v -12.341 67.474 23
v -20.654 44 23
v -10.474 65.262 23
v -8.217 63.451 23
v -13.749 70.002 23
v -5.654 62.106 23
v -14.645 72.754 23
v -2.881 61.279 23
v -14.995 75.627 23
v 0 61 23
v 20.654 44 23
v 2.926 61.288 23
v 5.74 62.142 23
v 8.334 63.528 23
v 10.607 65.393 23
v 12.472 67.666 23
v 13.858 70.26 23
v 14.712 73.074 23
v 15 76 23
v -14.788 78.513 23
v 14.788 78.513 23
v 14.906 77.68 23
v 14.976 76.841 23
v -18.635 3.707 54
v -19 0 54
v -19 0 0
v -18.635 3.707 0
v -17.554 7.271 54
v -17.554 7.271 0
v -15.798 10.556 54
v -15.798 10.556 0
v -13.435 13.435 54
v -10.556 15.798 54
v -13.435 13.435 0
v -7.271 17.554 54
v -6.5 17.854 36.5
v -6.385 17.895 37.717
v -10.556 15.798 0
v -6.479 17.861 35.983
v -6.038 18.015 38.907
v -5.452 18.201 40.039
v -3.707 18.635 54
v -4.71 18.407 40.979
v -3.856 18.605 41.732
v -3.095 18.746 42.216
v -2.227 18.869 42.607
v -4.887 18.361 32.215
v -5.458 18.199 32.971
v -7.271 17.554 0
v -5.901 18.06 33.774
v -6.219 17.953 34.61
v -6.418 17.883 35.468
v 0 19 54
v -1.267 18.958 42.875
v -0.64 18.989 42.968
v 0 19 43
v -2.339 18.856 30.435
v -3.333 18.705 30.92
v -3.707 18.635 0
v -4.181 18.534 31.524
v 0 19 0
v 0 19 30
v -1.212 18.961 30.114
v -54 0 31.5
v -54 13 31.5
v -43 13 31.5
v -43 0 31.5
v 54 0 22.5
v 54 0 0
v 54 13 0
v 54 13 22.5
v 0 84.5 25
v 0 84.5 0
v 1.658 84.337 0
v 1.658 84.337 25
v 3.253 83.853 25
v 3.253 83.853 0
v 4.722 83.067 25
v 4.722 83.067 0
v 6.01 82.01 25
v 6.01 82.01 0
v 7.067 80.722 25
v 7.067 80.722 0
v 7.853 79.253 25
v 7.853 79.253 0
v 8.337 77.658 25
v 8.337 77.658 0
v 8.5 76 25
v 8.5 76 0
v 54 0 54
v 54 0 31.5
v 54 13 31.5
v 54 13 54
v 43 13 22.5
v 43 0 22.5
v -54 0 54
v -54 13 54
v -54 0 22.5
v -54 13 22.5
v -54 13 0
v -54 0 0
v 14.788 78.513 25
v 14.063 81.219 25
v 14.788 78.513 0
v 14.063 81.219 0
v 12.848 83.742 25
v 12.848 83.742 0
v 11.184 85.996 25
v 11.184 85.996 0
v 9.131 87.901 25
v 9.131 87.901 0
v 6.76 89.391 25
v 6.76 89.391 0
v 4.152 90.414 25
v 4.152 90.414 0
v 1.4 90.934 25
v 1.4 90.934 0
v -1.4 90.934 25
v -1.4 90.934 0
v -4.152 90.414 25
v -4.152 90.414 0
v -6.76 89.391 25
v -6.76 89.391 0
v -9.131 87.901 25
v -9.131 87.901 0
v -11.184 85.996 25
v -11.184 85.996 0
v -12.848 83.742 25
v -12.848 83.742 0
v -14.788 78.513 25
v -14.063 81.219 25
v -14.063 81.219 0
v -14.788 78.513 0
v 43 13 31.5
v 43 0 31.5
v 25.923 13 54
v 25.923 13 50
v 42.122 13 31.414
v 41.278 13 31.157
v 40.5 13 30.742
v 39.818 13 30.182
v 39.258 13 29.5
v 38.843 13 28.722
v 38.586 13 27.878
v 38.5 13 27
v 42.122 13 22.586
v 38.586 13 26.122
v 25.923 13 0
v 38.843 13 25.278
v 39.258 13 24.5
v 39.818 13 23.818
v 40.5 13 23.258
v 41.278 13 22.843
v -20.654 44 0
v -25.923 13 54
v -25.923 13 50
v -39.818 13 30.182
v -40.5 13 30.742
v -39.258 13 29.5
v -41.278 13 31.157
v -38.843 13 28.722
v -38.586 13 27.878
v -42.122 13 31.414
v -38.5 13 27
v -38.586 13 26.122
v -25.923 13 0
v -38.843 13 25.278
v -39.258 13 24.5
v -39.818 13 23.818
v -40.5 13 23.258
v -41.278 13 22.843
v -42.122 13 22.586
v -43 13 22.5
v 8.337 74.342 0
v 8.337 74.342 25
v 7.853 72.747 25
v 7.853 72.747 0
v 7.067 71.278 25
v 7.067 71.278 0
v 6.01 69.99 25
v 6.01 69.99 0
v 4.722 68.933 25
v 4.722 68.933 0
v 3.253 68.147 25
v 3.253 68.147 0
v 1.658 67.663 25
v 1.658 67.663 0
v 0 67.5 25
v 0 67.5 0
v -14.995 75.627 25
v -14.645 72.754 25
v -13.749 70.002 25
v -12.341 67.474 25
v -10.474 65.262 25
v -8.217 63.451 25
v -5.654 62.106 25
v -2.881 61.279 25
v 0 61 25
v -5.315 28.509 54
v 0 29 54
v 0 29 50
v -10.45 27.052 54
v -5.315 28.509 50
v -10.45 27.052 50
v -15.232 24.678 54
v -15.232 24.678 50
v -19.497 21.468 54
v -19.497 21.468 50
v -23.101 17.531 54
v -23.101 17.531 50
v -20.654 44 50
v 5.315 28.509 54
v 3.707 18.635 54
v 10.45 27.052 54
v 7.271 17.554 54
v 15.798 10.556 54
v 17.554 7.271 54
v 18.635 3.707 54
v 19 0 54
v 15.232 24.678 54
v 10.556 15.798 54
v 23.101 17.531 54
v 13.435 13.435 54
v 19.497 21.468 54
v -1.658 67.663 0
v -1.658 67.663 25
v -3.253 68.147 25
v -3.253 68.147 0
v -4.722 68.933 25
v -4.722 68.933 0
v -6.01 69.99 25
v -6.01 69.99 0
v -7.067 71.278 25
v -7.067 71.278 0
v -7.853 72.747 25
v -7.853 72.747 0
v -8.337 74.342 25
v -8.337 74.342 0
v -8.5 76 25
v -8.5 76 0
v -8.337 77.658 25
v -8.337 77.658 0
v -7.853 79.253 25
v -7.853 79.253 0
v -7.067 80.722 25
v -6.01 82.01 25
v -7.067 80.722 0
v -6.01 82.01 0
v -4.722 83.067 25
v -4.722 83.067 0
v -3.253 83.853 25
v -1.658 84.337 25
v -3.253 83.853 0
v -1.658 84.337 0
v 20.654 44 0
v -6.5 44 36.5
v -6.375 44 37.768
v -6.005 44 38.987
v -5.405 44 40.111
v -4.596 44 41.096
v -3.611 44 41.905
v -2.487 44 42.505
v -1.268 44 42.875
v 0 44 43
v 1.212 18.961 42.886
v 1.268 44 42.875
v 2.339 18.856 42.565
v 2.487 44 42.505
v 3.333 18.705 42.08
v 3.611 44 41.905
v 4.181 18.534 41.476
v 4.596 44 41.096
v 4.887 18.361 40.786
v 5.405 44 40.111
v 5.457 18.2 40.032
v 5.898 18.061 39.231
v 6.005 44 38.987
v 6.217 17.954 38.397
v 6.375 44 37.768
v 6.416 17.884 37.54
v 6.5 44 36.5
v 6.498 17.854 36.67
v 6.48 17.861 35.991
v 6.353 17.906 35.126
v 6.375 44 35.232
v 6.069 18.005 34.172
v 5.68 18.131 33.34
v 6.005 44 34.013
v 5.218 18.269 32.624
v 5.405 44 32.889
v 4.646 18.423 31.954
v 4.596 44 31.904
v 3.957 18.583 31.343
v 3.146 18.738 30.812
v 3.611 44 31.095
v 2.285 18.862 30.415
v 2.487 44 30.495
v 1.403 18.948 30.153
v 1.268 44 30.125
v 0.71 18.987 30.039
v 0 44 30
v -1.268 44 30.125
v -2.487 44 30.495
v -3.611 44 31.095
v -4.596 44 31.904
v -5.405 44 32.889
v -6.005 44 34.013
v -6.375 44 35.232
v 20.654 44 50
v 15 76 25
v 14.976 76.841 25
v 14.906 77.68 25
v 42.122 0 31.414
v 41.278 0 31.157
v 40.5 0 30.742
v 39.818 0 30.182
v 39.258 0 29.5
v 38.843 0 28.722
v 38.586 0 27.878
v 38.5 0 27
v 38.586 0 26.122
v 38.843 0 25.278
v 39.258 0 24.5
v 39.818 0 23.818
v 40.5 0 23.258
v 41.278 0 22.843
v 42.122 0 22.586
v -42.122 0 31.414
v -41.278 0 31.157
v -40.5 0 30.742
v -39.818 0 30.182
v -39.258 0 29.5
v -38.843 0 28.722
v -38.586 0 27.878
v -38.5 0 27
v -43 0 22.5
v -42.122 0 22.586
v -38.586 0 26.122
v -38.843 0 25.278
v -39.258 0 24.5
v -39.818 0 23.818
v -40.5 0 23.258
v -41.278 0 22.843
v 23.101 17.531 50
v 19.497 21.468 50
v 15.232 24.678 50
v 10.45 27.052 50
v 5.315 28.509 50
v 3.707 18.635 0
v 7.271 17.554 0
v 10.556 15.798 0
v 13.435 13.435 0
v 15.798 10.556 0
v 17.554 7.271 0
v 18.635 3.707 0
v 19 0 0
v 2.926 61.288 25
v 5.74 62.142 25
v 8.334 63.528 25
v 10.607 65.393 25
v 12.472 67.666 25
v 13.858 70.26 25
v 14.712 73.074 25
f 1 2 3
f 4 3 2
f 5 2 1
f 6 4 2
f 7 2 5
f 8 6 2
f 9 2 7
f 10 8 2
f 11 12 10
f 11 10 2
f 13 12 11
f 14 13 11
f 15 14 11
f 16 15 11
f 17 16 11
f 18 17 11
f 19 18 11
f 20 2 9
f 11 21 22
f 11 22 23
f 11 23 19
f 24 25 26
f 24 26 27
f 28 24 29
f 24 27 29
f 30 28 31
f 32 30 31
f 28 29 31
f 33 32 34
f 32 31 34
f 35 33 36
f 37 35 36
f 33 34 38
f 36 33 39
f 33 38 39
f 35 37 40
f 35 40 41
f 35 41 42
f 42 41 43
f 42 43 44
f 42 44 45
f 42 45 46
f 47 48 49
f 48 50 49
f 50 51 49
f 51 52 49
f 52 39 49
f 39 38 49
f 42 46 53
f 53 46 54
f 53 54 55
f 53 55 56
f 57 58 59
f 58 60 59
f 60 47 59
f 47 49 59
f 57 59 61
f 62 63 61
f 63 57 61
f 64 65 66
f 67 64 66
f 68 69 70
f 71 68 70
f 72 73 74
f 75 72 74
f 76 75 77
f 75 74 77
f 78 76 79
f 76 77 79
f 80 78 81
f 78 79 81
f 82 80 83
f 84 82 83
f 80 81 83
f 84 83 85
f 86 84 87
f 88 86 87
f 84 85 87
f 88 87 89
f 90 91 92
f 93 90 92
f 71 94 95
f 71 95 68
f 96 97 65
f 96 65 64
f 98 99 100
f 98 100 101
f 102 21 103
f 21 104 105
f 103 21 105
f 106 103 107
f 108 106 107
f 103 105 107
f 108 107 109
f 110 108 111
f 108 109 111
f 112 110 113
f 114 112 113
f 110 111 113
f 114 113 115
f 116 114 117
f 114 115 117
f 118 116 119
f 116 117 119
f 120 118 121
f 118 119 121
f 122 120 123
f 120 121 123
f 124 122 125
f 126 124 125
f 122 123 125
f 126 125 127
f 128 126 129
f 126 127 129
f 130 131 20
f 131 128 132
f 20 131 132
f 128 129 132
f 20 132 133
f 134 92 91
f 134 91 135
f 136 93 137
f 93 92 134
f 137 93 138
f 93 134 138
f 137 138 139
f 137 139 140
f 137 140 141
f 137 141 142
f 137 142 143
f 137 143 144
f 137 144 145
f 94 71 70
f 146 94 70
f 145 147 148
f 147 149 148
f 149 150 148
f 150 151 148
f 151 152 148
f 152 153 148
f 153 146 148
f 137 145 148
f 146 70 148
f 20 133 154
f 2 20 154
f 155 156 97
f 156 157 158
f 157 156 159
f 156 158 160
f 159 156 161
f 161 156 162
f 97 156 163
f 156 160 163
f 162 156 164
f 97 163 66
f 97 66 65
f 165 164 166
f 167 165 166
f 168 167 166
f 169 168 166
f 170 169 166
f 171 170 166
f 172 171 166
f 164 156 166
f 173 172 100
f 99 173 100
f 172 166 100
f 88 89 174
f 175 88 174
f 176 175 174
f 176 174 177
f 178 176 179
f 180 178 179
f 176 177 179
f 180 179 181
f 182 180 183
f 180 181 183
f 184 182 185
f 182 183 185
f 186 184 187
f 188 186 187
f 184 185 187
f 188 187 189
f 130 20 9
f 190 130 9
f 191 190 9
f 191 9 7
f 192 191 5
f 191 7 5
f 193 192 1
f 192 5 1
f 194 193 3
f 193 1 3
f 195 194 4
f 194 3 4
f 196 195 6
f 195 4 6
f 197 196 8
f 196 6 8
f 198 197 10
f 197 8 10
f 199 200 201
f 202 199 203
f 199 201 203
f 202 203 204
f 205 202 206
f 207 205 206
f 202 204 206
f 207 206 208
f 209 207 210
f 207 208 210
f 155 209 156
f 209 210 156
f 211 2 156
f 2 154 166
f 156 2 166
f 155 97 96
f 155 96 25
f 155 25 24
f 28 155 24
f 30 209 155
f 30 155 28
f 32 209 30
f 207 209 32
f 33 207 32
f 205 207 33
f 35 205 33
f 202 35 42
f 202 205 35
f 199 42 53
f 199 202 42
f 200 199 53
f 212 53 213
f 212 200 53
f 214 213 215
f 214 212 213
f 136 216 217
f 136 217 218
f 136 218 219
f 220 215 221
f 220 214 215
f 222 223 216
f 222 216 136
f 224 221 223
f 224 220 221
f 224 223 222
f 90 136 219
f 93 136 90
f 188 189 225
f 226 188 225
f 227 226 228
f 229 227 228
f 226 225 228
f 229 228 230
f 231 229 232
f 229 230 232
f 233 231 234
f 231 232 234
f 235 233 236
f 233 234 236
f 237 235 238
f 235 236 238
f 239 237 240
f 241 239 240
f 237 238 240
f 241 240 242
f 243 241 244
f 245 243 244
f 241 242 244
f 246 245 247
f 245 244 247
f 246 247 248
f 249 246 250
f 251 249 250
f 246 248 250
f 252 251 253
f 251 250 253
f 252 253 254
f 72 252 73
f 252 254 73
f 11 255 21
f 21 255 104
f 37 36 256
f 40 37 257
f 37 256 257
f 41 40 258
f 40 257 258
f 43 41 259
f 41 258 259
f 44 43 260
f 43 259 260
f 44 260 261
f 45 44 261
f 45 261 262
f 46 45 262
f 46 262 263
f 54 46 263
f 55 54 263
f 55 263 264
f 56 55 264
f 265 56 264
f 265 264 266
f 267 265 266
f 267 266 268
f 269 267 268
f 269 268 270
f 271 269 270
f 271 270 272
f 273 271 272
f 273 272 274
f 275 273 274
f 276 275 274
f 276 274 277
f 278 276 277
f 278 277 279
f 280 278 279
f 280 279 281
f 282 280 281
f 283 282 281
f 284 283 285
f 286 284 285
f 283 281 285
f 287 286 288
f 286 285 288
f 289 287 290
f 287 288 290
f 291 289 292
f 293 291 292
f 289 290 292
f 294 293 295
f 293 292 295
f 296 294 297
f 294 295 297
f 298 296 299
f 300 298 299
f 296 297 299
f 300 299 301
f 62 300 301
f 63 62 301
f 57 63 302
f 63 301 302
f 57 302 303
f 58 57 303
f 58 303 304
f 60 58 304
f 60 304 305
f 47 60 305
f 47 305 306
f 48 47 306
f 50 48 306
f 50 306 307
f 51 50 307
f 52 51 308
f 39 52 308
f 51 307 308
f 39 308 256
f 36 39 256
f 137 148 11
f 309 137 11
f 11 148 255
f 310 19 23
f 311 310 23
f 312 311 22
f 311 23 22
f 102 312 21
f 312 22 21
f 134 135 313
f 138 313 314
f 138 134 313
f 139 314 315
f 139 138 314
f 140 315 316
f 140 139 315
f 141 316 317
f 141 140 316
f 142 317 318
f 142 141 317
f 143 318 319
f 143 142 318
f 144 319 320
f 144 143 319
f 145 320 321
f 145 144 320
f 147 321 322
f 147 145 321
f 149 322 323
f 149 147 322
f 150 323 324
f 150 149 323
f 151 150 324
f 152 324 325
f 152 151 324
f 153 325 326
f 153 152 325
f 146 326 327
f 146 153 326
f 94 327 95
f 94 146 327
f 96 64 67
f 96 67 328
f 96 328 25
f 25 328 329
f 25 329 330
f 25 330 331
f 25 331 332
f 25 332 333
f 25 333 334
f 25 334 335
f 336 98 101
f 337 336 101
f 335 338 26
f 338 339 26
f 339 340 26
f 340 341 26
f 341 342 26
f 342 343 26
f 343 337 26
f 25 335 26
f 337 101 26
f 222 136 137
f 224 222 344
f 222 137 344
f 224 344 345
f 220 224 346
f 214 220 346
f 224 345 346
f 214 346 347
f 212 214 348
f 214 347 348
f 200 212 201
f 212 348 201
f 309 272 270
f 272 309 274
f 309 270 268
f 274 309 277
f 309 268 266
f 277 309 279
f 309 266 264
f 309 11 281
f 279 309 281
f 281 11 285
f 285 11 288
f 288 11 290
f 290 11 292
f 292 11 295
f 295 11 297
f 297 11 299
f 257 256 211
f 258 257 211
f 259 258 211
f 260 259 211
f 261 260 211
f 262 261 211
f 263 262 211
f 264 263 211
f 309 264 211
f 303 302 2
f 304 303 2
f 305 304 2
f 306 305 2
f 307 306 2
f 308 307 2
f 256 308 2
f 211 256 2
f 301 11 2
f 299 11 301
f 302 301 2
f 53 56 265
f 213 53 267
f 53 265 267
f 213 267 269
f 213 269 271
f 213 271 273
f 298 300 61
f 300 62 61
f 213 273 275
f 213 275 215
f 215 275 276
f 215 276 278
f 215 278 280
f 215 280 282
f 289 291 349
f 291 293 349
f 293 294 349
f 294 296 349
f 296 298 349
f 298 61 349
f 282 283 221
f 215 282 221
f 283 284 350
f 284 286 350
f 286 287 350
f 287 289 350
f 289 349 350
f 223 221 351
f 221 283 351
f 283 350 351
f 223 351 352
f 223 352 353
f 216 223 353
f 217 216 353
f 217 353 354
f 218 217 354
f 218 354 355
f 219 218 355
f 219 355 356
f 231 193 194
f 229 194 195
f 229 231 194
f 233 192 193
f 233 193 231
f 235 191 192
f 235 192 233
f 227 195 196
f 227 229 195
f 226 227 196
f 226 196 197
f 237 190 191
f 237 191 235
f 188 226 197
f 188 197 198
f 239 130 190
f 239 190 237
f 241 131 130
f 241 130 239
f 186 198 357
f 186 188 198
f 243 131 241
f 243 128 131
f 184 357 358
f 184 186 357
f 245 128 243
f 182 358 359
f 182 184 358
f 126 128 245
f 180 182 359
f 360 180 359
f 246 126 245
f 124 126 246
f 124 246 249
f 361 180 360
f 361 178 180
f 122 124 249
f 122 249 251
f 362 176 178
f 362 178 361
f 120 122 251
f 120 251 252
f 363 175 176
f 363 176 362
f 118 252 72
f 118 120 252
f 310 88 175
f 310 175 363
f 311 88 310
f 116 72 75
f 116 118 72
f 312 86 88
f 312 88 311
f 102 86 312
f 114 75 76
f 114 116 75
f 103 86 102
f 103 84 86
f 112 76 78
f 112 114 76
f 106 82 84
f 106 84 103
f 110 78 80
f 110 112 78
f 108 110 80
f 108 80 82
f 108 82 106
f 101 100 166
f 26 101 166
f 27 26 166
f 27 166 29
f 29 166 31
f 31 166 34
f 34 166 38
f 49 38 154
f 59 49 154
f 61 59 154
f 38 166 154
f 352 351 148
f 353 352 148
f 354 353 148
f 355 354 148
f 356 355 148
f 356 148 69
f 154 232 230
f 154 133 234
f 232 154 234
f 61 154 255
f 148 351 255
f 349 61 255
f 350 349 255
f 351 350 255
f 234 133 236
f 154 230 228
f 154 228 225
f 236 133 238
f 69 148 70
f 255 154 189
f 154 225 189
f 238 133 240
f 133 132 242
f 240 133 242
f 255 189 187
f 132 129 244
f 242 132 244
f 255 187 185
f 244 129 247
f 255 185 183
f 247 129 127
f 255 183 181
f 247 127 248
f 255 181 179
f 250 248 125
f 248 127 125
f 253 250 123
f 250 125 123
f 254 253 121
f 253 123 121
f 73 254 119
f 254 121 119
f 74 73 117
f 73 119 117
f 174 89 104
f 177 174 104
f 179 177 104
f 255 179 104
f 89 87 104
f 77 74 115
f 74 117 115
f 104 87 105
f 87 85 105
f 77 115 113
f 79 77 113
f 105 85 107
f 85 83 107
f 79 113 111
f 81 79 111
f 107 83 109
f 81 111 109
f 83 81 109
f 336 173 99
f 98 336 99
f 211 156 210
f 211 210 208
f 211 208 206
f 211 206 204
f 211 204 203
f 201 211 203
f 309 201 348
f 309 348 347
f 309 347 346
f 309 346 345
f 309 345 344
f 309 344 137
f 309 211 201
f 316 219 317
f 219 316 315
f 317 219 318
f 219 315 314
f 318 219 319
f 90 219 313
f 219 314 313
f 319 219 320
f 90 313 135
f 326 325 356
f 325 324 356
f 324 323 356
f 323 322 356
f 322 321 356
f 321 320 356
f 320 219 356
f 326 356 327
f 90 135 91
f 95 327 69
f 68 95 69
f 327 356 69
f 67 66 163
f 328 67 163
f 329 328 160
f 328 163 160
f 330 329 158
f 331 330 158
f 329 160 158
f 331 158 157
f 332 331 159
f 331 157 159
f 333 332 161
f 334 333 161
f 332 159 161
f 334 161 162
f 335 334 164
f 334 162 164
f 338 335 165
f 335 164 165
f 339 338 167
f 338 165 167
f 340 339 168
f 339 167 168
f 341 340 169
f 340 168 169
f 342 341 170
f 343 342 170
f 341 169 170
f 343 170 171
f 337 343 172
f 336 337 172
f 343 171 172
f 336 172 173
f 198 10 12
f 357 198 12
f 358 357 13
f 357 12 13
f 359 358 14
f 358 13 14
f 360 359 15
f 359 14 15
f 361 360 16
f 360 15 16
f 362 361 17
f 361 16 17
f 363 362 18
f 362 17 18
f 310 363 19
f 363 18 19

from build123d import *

# Parameters (mm, degrees)
EXTRUDE_1_DEPTH          = 54
EXTRUDE_2_DEPTH          = 50
EXTRUDE_3_DEPTH          = 23
EXTRUDE_4_DEPTH          = 25
CUT_EXTRUDE_1_REACH      = 91.672
CUT_EXTRUDE_1_END_RADIUS = 19
SKETCH_2_R               = 6.5
CUT_EXTRUDE_2_REACH      = 111.16


with BuildPart() as part:
    # 草图1 → 凸台-拉伸1 (new body)
    with BuildSketch(Plane.XY):
        with BuildLine():
            Line((54, 13), (25.922962794, 13))
            ThreePointArc((25.922962794, 13), (15.231546212, 24.677925359), (0, 29))
            Line((0, 29), (0, 19))
            ThreePointArc((0, 19), (13.435028843, 13.435028843), (19, 0))
            Line((19, 0), (54, 0))
            Line((54, 0), (54, 13))
        make_face()
        with BuildLine():
            ThreePointArc((0, 29), (-15.231546212, 24.677925359), (-25.922962794, 13))
            Line((-25.922962794, 13), (-54, 13))
            Line((-54, 13), (-54, 0))
            Line((-54, 0), (-19, 0))
            ThreePointArc((-19, 0), (-13.435028843, 13.435028843), (0, 19))
            Line((0, 19), (0, 29))
        make_face()
    extrude(amount=EXTRUDE_1_DEPTH)

    # 草图1<3> → 凸台-拉伸2 (add)
    with BuildSketch(Plane.XY):
        with BuildLine():
            Line((25.922962794, 13), (20.654024341, 44))
            Line((20.654024341, 44), (0, 44))
            Line((0, 44), (0, 29))
            ThreePointArc((0, 29), (15.231546212, 24.677925359), (25.922962794, 13))
        make_face()
        with BuildLine():
            Line((0, 44), (-20.654024341, 44))
            Line((-20.654024341, 44), (-25.922962794, 13))
            ThreePointArc((-25.922962794, 13), (-15.231546212, 24.677925359), (0, 29))
            Line((0, 29), (0, 44))
        make_face()
    extrude(amount=EXTRUDE_2_DEPTH)

    # 草图1<5> → 凸台-拉伸3 (add)
    with BuildSketch(Plane.XY):
        with BuildLine():
            ThreePointArc((0, 61), (-11.460837745, 66.322748418), (-14.78792136, 78.513440241))
            Line((-14.78792136, 78.513440241), (-20.654024341, 44))
            Line((-20.654024341, 44), (0, 44))
            Line((0, 44), (0, 61))
        make_face()
        with BuildLine():
            Line((20.654024341, 44), (14.78792136, 78.513440241))
            ThreePointArc((14.78792136, 78.513440241), (14.946886305, 77.26118587), (15, 76))
            ThreePointArc((15, 76), (10.606601718, 65.393398282), (0, 61))
            Line((0, 61), (0, 44))
            Line((0, 44), (20.654024341, 44))
        make_face()
    extrude(amount=EXTRUDE_3_DEPTH)

    # 草图1<6> → 凸台-拉伸4 (add)
    with BuildSketch(Plane.XY):
        with BuildLine():
            ThreePointArc((14.78792136, 78.513440241), (9.677251582, 87.460837745), (0, 91))
            Line((0, 91), (0, 84.5))
            ThreePointArc((0, 84.5), (6.01040764, 82.01040764), (8.5, 76))
            ThreePointArc((8.5, 76), (6.01040764, 69.98959236), (0, 67.5))
            Line((0, 67.5), (0, 61))
            ThreePointArc((0, 61), (10.606601718, 65.393398282), (15, 76))
            ThreePointArc((15, 76), (14.946886305, 77.26118587), (14.78792136, 78.513440241))
        make_face()
        with BuildLine():
            Line((0, 84.5), (0, 91))
            ThreePointArc((0, 91), (-9.677251582, 87.460837745), (-14.78792136, 78.513440241))
            ThreePointArc((-14.78792136, 78.513440241), (-11.460837745, 66.322748418), (0, 61))
            Line((0, 61), (0, 67.5))
            ThreePointArc((0, 67.5), (-8.5, 76), (0, 84.5))
        make_face()
    extrude(amount=EXTRUDE_4_DEPTH)

    # 切除-拉伸1: up to this cylinder (the profile starts outside it)
    cut_extrude_1_end = Plane(origin=(0, 0, 36.5), z_dir=(0, 0, -1)) * Cylinder(CUT_EXTRUDE_1_END_RADIUS, 222.344, mode=Mode.PRIVATE)
    # 草图2 → 切除-拉伸1 (cut, up to the surface)
    with BuildSketch(Plane(origin=(0, 44, 0), x_dir=(1, 0, 0), z_dir=(0, 1, 0)), mode=Mode.PRIVATE) as cut_extrude_1_sk1:
        with Locations(Location((0, -36.5, 0), (0, 0, 180))):
            Circle(SKETCH_2_R)
    cut_extrude_1_tool1 = extrude(cut_extrude_1_sk1.sketch, amount=-CUT_EXTRUDE_1_REACH, mode=Mode.PRIVATE) - cut_extrude_1_end
    add(cut_extrude_1_tool1.solids().sort_by_distance((0, 44, 36.5))[0], mode=Mode.SUBTRACT)

    # 草图3 → 切除-拉伸2 (cut, up to next)
    with BuildSketch(Plane(origin=(0, 13, 0), x_dir=(1, 0, 0), z_dir=(0, 1, 0)), mode=Mode.PRIVATE) as cut_extrude_2_sk1:
        with BuildLine():
            Line((-43, -22.5), (-54, -22.5))
            Line((-54, -22.5), (-54, -31.5))
            Line((-54, -31.5), (-43, -31.5))
            ThreePointArc((-43, -31.5), (-38.5, -27), (-43, -22.5))
        make_face()
    cut_extrude_2_tool1 = extrude(cut_extrude_2_sk1.sketch, amount=-CUT_EXTRUDE_2_REACH, mode=Mode.PRIVATE) & part.part
    # 草图3 → 切除-拉伸2 (cut, up to next)
    with BuildSketch(Plane(origin=(0, 13, 0), x_dir=(1, 0, 0), z_dir=(0, 1, 0)), mode=Mode.PRIVATE) as cut_extrude_2_sk2:
        with BuildLine():
            Line((54, -22.5), (54, -31.5))
            Line((54, -31.5), (43, -31.5))
            ThreePointArc((43, -31.5), (38.5, -27), (43, -22.5))
            Line((43, -22.5), (54, -22.5))
        make_face()
    cut_extrude_2_tool2 = extrude(cut_extrude_2_sk2.sketch, amount=-CUT_EXTRUDE_2_REACH, mode=Mode.PRIVATE) & part.part
    add(cut_extrude_2_tool1.solids().sort_by_distance((-46.698151, 13, 27))[0], mode=Mode.SUBTRACT)
    add(cut_extrude_2_tool2.solids().sort_by_distance((46.698151, 13, 27))[0], mode=Mode.SUBTRACT)


solid = part.part
